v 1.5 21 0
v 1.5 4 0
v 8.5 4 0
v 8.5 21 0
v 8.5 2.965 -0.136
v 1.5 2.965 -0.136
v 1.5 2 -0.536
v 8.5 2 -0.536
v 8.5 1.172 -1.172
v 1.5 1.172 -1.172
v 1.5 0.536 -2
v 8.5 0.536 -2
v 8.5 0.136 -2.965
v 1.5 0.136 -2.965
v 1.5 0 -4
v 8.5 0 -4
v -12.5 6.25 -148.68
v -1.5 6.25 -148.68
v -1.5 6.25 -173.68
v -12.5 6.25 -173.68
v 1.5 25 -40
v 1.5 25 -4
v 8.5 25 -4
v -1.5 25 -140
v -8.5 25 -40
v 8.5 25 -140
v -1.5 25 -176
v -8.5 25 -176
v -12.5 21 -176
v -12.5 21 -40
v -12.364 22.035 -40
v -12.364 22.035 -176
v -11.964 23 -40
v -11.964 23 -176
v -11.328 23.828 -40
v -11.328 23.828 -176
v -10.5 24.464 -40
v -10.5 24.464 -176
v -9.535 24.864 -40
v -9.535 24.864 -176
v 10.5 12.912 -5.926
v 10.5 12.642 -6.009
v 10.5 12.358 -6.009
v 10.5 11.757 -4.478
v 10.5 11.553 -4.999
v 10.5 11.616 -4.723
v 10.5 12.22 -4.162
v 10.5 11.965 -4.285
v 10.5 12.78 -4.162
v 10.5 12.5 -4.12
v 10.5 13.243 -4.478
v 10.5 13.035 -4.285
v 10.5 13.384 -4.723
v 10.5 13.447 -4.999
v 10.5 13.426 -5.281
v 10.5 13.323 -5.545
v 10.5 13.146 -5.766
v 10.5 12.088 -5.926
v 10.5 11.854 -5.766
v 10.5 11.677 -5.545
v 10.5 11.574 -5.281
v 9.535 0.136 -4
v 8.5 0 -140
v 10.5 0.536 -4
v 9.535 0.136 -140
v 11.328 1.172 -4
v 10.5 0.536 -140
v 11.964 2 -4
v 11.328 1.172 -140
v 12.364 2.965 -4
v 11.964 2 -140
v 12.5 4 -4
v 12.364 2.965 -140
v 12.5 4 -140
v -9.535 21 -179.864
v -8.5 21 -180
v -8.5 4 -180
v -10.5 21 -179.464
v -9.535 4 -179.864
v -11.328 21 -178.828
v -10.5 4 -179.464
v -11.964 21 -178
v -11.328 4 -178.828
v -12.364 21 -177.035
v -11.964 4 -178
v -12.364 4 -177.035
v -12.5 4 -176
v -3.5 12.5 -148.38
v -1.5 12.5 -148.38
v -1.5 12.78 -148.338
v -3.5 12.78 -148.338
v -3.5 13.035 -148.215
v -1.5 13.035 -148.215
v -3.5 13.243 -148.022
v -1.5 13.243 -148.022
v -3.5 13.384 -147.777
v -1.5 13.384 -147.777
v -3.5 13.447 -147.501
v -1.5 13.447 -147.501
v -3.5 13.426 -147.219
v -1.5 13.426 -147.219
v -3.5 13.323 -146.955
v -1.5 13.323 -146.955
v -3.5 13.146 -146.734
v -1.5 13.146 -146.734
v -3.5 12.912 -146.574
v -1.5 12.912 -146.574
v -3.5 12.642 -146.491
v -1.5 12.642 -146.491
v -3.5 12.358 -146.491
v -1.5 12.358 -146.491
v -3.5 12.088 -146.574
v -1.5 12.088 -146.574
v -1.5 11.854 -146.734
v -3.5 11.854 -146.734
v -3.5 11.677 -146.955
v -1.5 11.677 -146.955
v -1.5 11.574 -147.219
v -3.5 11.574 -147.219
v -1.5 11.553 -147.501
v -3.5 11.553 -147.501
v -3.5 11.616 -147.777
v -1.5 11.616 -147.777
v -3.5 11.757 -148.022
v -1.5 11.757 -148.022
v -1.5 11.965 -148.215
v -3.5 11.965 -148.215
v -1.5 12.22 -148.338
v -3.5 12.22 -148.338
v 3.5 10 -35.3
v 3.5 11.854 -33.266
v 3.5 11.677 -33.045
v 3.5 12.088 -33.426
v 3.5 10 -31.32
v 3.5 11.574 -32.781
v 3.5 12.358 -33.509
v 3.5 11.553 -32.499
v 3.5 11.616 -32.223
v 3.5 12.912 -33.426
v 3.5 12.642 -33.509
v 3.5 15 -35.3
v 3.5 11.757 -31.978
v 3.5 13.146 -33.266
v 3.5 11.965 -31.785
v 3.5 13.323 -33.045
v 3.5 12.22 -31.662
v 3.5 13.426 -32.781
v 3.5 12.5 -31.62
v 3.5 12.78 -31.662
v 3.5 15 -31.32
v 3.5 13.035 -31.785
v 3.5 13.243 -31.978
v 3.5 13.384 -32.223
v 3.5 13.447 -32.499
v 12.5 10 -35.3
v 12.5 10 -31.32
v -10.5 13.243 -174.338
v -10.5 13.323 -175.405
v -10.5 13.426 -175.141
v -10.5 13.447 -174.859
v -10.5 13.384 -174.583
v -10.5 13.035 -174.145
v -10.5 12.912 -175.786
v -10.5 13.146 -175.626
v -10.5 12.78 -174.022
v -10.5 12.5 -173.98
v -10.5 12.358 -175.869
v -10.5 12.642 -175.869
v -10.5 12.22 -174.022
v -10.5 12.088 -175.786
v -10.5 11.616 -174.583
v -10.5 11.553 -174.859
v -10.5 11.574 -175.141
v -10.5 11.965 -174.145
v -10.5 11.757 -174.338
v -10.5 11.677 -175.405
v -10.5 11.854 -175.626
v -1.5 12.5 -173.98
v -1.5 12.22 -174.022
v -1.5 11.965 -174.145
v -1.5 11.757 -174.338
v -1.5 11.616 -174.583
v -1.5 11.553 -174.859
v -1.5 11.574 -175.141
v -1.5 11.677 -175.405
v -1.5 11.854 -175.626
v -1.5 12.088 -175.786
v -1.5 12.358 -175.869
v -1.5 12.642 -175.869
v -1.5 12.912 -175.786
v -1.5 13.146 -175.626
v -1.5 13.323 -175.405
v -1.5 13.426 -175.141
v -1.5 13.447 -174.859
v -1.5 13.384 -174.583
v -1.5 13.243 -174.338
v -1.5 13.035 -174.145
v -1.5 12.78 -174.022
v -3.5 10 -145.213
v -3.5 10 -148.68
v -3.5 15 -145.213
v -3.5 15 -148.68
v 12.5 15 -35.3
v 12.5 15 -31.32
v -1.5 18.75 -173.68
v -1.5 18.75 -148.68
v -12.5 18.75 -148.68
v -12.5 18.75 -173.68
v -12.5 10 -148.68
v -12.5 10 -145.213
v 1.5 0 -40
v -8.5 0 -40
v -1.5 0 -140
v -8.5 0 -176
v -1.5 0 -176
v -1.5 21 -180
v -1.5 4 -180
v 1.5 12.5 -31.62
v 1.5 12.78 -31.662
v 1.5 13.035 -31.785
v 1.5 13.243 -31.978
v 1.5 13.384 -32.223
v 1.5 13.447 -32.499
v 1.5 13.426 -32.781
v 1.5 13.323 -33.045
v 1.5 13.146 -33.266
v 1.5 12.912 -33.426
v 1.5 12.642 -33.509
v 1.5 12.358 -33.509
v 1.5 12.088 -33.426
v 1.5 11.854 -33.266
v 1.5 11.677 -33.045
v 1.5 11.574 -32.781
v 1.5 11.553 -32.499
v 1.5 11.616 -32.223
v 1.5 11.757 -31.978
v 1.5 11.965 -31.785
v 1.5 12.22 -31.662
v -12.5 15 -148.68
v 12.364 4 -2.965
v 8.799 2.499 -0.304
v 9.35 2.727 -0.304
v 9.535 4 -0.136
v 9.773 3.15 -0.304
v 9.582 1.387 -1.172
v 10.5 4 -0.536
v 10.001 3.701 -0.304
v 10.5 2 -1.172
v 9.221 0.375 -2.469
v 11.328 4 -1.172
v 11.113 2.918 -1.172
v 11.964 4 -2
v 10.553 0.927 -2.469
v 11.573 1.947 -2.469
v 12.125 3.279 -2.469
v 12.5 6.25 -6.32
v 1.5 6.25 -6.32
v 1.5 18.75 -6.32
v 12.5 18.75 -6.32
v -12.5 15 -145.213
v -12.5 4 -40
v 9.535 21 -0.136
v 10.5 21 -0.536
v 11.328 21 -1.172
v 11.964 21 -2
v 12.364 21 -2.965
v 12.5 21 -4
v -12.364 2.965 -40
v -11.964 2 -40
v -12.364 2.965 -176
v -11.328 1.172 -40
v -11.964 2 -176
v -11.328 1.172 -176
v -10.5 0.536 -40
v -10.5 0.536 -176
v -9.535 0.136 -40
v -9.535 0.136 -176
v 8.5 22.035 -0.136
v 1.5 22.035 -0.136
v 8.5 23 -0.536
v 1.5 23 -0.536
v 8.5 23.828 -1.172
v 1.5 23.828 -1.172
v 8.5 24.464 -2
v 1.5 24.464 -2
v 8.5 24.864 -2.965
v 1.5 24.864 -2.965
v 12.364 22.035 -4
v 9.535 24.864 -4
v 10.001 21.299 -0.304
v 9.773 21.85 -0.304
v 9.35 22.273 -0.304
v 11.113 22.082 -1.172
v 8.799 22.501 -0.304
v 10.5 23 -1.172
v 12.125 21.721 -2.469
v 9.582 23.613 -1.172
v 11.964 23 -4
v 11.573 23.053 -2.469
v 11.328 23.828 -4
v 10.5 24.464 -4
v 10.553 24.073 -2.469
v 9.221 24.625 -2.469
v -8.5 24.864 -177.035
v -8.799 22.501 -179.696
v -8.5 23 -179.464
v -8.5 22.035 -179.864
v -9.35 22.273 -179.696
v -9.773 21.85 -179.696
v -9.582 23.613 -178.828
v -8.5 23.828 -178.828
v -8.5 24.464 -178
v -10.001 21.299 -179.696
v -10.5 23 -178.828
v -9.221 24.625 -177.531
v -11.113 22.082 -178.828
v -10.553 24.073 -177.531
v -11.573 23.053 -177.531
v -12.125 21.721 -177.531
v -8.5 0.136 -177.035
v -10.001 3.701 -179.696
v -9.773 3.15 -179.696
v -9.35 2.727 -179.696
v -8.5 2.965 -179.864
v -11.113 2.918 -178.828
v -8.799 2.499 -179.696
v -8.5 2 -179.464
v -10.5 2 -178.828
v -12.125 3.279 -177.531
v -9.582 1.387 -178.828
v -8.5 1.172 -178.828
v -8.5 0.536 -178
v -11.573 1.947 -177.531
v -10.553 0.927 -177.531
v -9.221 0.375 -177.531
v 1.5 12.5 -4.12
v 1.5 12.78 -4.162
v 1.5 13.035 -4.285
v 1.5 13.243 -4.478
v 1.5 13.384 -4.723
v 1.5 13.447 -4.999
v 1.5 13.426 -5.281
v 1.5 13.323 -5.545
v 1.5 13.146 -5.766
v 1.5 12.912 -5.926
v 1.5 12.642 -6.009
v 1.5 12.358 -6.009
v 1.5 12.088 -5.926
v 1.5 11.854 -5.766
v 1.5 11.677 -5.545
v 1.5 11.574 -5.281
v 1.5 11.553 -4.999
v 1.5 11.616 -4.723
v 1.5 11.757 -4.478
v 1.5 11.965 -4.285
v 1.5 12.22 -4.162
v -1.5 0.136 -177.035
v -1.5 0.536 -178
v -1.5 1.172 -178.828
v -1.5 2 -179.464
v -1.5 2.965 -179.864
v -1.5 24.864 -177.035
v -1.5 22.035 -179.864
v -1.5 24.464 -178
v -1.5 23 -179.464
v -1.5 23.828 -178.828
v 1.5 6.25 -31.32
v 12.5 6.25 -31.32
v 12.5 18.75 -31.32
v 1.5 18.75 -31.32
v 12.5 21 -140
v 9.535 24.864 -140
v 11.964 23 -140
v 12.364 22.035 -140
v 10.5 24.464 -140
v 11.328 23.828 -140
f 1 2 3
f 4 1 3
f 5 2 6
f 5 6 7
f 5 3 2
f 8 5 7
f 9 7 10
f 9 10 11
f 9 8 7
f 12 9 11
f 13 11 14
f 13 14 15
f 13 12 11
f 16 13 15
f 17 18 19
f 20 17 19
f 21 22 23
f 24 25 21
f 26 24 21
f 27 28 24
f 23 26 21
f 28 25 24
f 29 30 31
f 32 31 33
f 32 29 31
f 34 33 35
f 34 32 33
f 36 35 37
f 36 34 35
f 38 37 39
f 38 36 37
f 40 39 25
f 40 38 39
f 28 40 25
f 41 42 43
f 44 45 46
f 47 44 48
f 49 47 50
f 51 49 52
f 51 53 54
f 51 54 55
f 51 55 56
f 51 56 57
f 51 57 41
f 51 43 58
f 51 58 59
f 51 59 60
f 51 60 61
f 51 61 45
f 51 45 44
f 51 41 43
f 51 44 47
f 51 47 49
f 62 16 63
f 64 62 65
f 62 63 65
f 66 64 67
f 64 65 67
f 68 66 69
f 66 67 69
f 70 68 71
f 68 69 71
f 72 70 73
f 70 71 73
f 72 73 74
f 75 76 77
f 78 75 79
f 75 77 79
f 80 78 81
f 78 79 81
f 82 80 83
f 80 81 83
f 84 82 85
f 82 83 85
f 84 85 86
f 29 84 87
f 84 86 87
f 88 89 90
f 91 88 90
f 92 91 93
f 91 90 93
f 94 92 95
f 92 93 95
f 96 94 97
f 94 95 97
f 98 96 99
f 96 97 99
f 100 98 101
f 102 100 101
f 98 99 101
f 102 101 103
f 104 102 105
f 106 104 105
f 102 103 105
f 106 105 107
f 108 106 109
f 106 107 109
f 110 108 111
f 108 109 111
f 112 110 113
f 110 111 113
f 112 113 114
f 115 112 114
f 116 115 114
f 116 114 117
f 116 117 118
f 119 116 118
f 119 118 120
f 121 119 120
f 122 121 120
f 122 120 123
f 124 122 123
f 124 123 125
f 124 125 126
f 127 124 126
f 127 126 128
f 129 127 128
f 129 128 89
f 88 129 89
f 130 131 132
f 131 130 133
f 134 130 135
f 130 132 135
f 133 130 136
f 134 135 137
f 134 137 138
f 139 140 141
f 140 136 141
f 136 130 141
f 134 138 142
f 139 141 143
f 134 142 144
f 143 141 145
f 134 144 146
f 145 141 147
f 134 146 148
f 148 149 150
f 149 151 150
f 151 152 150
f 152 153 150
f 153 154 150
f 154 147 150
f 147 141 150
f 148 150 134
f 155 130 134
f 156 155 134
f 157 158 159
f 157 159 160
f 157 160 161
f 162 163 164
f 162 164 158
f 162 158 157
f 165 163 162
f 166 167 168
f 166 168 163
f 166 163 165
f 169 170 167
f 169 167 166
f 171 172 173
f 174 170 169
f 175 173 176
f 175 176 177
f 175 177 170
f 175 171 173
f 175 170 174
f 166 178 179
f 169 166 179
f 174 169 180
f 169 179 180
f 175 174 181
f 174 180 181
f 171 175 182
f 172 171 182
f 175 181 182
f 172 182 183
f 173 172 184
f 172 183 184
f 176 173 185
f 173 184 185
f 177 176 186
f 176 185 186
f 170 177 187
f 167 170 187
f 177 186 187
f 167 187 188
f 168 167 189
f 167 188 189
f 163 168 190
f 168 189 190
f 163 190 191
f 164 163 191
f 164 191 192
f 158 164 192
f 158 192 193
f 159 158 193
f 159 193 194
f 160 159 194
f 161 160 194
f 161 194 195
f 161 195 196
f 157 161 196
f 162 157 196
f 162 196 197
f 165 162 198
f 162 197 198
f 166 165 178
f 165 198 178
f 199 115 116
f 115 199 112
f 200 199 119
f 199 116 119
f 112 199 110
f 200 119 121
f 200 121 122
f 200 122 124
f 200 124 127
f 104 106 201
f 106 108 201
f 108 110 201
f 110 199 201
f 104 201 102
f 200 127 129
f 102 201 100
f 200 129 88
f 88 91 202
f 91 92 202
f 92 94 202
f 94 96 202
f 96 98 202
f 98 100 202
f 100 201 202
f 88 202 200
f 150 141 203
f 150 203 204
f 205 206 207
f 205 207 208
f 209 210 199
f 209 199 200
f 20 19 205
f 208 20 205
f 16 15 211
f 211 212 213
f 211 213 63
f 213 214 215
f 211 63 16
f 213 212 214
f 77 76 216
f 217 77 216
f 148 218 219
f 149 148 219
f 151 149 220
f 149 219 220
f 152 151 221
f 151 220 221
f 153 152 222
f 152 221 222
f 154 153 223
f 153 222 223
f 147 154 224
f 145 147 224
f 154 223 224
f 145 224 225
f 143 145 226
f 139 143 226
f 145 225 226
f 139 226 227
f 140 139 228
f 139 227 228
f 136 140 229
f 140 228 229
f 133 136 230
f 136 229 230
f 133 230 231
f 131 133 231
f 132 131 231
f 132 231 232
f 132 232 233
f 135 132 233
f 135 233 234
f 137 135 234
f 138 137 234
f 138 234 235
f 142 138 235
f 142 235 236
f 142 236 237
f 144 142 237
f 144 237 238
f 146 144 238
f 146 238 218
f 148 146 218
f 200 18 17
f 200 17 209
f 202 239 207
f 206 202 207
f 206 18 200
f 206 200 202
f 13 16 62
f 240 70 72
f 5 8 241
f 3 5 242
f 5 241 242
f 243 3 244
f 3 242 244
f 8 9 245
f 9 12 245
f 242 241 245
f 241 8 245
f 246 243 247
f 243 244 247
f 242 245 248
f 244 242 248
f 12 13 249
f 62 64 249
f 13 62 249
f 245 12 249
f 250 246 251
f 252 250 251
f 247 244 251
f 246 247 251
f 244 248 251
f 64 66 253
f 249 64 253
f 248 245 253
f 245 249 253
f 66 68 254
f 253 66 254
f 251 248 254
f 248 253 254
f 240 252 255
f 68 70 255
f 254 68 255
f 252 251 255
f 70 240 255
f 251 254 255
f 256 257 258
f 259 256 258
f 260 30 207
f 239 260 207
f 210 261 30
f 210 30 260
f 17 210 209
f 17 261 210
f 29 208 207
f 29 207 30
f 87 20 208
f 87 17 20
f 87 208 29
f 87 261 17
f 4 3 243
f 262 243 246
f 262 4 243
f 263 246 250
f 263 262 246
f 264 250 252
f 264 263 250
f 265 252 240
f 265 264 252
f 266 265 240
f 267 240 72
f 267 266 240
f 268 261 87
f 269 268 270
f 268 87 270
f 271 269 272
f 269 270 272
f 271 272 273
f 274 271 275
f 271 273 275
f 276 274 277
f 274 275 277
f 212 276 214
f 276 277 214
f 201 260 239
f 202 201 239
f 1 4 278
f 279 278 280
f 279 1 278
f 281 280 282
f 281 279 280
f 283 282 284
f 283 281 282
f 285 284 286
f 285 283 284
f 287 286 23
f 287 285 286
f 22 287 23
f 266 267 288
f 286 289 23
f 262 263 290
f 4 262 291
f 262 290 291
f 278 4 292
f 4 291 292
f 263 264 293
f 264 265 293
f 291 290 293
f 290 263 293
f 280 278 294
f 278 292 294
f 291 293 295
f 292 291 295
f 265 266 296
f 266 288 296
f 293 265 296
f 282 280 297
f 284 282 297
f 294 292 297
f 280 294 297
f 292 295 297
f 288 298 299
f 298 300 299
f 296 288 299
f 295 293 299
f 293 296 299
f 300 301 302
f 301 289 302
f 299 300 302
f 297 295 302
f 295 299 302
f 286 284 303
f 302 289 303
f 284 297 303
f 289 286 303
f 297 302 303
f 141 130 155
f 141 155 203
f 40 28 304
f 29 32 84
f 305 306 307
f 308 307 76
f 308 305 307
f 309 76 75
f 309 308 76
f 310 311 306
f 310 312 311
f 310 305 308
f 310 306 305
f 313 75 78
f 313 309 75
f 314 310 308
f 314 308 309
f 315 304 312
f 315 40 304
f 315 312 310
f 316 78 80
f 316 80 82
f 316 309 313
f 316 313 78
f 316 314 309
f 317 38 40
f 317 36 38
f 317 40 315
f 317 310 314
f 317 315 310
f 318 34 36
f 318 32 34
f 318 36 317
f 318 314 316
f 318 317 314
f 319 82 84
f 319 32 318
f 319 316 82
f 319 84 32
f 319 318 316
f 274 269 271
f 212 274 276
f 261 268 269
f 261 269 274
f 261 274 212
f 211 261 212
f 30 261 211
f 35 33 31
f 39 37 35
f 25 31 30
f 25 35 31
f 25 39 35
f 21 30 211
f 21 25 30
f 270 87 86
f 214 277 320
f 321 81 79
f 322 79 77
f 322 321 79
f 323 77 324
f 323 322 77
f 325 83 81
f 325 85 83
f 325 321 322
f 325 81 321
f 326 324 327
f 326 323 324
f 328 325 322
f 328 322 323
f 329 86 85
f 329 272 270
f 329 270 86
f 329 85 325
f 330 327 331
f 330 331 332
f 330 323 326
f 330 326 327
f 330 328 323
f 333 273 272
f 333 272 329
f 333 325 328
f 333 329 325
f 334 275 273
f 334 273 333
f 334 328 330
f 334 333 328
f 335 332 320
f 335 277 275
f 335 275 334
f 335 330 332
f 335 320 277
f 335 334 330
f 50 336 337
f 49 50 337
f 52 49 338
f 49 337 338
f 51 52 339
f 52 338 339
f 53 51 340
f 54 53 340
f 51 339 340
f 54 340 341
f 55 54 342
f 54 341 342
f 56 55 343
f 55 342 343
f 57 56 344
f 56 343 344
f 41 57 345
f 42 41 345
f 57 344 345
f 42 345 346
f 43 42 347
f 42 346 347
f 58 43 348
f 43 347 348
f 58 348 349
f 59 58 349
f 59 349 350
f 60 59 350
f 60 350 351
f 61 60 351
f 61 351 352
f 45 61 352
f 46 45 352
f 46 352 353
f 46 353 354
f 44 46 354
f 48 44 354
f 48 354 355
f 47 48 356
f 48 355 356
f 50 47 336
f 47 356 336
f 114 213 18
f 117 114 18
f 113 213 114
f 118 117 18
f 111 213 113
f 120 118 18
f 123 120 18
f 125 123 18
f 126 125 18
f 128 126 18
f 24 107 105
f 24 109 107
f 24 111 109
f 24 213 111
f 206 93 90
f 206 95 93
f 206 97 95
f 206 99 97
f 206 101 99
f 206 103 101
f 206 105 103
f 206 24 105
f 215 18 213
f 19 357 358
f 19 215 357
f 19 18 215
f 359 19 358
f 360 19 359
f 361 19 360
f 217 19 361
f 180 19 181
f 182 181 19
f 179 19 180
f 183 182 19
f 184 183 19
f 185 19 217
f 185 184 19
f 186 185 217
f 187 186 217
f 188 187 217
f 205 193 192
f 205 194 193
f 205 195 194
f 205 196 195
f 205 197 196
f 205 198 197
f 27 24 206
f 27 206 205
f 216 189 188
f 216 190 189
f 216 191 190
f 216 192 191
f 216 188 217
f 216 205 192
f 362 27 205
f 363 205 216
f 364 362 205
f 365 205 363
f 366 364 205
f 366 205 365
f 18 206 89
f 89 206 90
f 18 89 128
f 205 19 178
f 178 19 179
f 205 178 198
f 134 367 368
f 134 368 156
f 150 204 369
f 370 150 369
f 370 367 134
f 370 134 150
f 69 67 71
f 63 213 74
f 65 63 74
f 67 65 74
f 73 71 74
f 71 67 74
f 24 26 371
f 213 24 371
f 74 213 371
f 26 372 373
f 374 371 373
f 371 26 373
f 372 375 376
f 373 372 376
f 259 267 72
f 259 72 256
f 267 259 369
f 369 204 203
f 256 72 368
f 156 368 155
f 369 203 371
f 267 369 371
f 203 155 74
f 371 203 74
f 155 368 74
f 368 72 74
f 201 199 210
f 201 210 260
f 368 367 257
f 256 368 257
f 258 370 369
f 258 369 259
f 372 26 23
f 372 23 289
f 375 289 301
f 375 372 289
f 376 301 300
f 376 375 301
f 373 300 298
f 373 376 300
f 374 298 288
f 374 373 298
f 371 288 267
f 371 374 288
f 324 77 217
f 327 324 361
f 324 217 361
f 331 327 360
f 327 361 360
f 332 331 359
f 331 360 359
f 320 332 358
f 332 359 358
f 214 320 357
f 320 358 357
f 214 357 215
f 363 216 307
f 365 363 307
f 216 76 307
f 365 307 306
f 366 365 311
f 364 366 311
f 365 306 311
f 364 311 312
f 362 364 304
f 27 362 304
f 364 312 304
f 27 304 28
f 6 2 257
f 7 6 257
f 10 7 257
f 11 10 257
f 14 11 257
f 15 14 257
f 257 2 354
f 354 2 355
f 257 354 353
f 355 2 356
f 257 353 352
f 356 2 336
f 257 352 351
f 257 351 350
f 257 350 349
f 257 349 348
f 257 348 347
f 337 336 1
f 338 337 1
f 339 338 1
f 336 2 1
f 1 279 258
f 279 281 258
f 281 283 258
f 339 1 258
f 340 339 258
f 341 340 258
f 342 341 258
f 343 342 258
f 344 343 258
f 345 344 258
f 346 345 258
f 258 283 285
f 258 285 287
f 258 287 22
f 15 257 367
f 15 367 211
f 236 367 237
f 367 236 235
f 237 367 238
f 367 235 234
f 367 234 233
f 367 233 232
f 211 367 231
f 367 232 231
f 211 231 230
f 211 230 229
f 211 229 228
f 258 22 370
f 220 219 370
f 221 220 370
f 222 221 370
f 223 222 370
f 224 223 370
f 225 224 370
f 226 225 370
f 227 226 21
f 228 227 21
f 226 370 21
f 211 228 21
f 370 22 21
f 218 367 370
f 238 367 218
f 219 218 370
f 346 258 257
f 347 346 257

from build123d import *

# Parameters (mm, degrees)
SKETCH3_W           = 25
SKETCH3_H           = 180
BOSS_EXTRUDE1_DEPTH = 25
SKETCH4_W           = 14
SKETCH4_H           = 40
CUT_EXTRUDE1_DEPTH  = 183.157212319
SKETCH6_W           = 25
SKETCH6_H           = 12.5
CUT_EXTRUDE2_DEPTH  = 183.26628871
SKETCH6_3_R         = 0.95
CUT_EXTRUDE3_DEPTH  = 9
SKETCH8_W           = 25
SKETCH8_H           = 12.5
CUT_EXTRUDE4_DEPTH  = 183.26628871
SKETCH8_3_R         = 0.95
CUT_EXTRUDE5_DEPTH  = 9
FILLET1_R           = 4
CUT_EXTRUDE6_START  = -2
SKETCH12_W          = 3.466571871
SKETCH12_H          = 5
CUT_EXTRUDE6_DEPTH  = 10
CUT_EXTRUDE7_START  = -2
SKETCH11_W          = 3.979632528
SKETCH11_H          = 5
CUT_EXTRUDE7_DEPTH  = 14
FILLET2_R           = 4
FILLET3_R           = 4


with BuildPart() as part:
    # Sketch3 → Boss-Extrude1 (new body)
    with BuildSketch(Plane(origin=(0, 0, 0), x_dir=(1, 0, 0), z_dir=(0, 1, 0))):
        with Locations((0, 90)):
            Rectangle(SKETCH3_W, SKETCH3_H)
    extrude(amount=BOSS_EXTRUDE1_DEPTH)

    # Sketch4 → Cut-Extrude1 (cut, through all)
    with BuildSketch(Plane(origin=(0, 25, 0), x_dir=(1, 0, 0), z_dir=(0, 1, 0))):
        with Locations((-5.5, 20)):
            Rectangle(SKETCH4_W, SKETCH4_H)
        with Locations((5.5, 160)):
            Rectangle(SKETCH4_W, SKETCH4_H)
    extrude(amount=-CUT_EXTRUDE1_DEPTH, mode=Mode.SUBTRACT)

    # Sketch6 → Cut-Extrude2 (cut, through all)
    with BuildSketch(Plane.ZY.offset(-1.5)):
        with Locations((-18.82, 12.5)):
            Rectangle(SKETCH6_W, SKETCH6_H)
    extrude(amount=-CUT_EXTRUDE2_DEPTH, mode=Mode.SUBTRACT)

    # Sketch6<3> → Cut-Extrude3 (cut)
    with BuildSketch(Plane.ZY.offset(-1.5)):
        with Locations((-32.57, 12.5)):
            Circle(SKETCH6_3_R)
        with Locations((-5.07, 12.5)):
            Circle(SKETCH6_3_R)
    extrude(amount=-CUT_EXTRUDE3_DEPTH, mode=Mode.SUBTRACT)

    # Sketch8 → Cut-Extrude4 (cut, through all)
    with BuildSketch(Plane(origin=(-1.5, 0, 0), x_dir=(0, 0, -1), z_dir=(1, 0, 0))):
        with Locations((161.18, 12.5)):
            Rectangle(SKETCH8_W, SKETCH8_H)
    extrude(amount=-CUT_EXTRUDE4_DEPTH, mode=Mode.SUBTRACT)

    # Sketch8<3> → Cut-Extrude5 (cut)
    with BuildSketch(Plane(origin=(-1.5, 0, 0), x_dir=(0, 0, -1), z_dir=(1, 0, 0))):
        with Locations((147.43, 12.5)):
            Circle(SKETCH8_3_R)
        with Locations((174.93, 12.5)):
            Circle(SKETCH8_3_R)
    extrude(amount=-CUT_EXTRUDE5_DEPTH, mode=Mode.SUBTRACT)

    # Fillet1
    fillet1_edges = [part.edges().sort_by_distance(p)[0] for p in [
        (-12.5, 0, -110),
        (-12.5, 25, -110),
        (12.5, 0, -70),
        (12.5, 25, -70),
    ]]
    fillet(fillet1_edges, radius=FILLET1_R)

    # Sketch12 → Cut-Extrude6 (cut)
    with BuildSketch(Plane(origin=(-1.5, 0, 0), x_dir=(0, 0, -1), z_dir=(1, 0, 0)).offset(CUT_EXTRUDE6_START)):
        with Locations((146.946714065, 12.5)):
            Rectangle(SKETCH12_W, SKETCH12_H)
    extrude(amount=-CUT_EXTRUDE6_DEPTH, mode=Mode.SUBTRACT)

    # Sketch11 → Cut-Extrude7 (cut)
    with BuildSketch(Plane.ZY.offset(-1.5).offset(CUT_EXTRUDE7_START)):
        with Locations((-33.309816264, 12.5)):
            Rectangle(SKETCH11_W, SKETCH11_H)
    extrude(amount=-CUT_EXTRUDE7_DEPTH, mode=Mode.SUBTRACT)

    # Fillet2
    fillet2_edges = [part.edges().sort_by_distance(p)[0] for p in [
        (-5, 25, -180),
        (-11.328427125, 23.828427125, -180),
        (-5, 0, -180),
        (-11.328427125, 1.171572875, -180),
        (-12.5, 12.5, -180),
    ]]
    fillet(fillet2_edges, radius=FILLET2_R)

    # Fillet3
    fillet3_edges = [part.edges().sort_by_distance(p)[0] for p in [
        (5, 25, 0),
        (11.328427125, 23.828427125, 0),
        (5, 0, 0),
        (11.328427125, 1.171572875, 0),
        (12.5, 12.5, 0),
    ]]
    fillet(fillet3_edges, radius=FILLET3_R)


solid = part.part
